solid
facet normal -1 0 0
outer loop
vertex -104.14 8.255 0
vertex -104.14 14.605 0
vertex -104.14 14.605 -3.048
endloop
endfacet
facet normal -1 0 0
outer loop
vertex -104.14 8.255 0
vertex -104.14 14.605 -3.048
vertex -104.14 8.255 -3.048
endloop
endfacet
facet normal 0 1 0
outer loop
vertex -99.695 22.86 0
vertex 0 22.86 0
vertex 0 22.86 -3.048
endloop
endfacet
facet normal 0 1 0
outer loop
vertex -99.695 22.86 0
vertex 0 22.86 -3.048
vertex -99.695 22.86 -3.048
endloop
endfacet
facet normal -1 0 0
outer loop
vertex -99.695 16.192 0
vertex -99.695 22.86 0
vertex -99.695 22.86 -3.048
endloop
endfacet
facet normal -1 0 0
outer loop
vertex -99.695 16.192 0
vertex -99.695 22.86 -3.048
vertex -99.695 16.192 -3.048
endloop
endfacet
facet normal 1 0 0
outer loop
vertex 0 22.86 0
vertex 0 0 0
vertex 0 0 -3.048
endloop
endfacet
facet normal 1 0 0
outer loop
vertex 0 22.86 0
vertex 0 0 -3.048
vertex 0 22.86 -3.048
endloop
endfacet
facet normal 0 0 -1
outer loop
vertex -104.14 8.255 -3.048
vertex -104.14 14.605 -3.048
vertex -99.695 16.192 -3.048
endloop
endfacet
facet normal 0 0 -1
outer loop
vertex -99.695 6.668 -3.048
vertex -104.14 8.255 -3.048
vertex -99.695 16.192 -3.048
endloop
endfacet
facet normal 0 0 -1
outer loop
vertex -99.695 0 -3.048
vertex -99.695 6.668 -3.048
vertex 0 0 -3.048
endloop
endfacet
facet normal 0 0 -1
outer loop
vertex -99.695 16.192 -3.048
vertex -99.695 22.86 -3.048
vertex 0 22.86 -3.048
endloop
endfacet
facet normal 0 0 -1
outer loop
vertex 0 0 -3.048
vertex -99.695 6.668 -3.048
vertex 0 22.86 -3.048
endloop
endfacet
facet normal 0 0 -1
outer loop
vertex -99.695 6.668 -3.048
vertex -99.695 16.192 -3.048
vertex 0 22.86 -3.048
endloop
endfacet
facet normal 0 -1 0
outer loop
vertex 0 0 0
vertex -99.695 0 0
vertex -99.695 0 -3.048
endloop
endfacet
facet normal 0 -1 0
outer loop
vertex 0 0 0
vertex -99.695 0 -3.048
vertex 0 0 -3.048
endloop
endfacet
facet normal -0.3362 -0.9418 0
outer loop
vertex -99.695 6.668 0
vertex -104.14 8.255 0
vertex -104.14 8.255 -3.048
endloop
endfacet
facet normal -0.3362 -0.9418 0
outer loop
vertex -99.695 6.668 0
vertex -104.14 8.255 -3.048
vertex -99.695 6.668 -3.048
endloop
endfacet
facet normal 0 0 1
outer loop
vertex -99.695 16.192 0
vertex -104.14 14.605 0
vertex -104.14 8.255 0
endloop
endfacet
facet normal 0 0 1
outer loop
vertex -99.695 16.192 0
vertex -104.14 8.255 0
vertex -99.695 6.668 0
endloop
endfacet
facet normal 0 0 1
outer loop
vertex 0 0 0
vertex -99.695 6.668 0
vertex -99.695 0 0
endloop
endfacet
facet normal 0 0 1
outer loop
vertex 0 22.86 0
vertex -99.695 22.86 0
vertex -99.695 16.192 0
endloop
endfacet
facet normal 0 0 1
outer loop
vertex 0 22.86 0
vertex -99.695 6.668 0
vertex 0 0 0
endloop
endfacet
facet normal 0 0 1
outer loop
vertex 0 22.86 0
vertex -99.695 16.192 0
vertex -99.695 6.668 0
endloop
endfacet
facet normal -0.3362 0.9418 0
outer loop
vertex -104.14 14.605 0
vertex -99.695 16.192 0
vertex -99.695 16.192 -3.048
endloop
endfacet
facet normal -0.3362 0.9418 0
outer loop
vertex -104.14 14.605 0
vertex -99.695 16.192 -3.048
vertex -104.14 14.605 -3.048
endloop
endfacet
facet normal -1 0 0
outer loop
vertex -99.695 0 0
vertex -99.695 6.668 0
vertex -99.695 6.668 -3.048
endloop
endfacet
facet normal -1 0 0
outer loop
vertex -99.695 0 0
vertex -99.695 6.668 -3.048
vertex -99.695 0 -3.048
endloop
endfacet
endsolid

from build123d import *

# Parameters (mm, degrees)
F1_DEPTH = 3.048


with BuildPart() as f1:
    # F0 (on Top) → F1 (new body)
    with BuildSketch(Plane.XY):
        Polygon((-99.695, 0), (0, 0), (0, 22.86), (-99.695, 22.86), (-99.695, 16.1925), (-99.695, 11.43), (-99.695, 6.6675), align=None)
        Polygon((-104.14, 8.255), (-99.695, 6.6675), (-99.695, 11.43), (-104.14, 11.43), align=None)
        Polygon((-104.14, 11.43), (-99.695, 11.43), (-99.695, 16.1925), (-104.14, 14.605), align=None)
    extrude(amount=-F1_DEPTH)


solid = f1.part
